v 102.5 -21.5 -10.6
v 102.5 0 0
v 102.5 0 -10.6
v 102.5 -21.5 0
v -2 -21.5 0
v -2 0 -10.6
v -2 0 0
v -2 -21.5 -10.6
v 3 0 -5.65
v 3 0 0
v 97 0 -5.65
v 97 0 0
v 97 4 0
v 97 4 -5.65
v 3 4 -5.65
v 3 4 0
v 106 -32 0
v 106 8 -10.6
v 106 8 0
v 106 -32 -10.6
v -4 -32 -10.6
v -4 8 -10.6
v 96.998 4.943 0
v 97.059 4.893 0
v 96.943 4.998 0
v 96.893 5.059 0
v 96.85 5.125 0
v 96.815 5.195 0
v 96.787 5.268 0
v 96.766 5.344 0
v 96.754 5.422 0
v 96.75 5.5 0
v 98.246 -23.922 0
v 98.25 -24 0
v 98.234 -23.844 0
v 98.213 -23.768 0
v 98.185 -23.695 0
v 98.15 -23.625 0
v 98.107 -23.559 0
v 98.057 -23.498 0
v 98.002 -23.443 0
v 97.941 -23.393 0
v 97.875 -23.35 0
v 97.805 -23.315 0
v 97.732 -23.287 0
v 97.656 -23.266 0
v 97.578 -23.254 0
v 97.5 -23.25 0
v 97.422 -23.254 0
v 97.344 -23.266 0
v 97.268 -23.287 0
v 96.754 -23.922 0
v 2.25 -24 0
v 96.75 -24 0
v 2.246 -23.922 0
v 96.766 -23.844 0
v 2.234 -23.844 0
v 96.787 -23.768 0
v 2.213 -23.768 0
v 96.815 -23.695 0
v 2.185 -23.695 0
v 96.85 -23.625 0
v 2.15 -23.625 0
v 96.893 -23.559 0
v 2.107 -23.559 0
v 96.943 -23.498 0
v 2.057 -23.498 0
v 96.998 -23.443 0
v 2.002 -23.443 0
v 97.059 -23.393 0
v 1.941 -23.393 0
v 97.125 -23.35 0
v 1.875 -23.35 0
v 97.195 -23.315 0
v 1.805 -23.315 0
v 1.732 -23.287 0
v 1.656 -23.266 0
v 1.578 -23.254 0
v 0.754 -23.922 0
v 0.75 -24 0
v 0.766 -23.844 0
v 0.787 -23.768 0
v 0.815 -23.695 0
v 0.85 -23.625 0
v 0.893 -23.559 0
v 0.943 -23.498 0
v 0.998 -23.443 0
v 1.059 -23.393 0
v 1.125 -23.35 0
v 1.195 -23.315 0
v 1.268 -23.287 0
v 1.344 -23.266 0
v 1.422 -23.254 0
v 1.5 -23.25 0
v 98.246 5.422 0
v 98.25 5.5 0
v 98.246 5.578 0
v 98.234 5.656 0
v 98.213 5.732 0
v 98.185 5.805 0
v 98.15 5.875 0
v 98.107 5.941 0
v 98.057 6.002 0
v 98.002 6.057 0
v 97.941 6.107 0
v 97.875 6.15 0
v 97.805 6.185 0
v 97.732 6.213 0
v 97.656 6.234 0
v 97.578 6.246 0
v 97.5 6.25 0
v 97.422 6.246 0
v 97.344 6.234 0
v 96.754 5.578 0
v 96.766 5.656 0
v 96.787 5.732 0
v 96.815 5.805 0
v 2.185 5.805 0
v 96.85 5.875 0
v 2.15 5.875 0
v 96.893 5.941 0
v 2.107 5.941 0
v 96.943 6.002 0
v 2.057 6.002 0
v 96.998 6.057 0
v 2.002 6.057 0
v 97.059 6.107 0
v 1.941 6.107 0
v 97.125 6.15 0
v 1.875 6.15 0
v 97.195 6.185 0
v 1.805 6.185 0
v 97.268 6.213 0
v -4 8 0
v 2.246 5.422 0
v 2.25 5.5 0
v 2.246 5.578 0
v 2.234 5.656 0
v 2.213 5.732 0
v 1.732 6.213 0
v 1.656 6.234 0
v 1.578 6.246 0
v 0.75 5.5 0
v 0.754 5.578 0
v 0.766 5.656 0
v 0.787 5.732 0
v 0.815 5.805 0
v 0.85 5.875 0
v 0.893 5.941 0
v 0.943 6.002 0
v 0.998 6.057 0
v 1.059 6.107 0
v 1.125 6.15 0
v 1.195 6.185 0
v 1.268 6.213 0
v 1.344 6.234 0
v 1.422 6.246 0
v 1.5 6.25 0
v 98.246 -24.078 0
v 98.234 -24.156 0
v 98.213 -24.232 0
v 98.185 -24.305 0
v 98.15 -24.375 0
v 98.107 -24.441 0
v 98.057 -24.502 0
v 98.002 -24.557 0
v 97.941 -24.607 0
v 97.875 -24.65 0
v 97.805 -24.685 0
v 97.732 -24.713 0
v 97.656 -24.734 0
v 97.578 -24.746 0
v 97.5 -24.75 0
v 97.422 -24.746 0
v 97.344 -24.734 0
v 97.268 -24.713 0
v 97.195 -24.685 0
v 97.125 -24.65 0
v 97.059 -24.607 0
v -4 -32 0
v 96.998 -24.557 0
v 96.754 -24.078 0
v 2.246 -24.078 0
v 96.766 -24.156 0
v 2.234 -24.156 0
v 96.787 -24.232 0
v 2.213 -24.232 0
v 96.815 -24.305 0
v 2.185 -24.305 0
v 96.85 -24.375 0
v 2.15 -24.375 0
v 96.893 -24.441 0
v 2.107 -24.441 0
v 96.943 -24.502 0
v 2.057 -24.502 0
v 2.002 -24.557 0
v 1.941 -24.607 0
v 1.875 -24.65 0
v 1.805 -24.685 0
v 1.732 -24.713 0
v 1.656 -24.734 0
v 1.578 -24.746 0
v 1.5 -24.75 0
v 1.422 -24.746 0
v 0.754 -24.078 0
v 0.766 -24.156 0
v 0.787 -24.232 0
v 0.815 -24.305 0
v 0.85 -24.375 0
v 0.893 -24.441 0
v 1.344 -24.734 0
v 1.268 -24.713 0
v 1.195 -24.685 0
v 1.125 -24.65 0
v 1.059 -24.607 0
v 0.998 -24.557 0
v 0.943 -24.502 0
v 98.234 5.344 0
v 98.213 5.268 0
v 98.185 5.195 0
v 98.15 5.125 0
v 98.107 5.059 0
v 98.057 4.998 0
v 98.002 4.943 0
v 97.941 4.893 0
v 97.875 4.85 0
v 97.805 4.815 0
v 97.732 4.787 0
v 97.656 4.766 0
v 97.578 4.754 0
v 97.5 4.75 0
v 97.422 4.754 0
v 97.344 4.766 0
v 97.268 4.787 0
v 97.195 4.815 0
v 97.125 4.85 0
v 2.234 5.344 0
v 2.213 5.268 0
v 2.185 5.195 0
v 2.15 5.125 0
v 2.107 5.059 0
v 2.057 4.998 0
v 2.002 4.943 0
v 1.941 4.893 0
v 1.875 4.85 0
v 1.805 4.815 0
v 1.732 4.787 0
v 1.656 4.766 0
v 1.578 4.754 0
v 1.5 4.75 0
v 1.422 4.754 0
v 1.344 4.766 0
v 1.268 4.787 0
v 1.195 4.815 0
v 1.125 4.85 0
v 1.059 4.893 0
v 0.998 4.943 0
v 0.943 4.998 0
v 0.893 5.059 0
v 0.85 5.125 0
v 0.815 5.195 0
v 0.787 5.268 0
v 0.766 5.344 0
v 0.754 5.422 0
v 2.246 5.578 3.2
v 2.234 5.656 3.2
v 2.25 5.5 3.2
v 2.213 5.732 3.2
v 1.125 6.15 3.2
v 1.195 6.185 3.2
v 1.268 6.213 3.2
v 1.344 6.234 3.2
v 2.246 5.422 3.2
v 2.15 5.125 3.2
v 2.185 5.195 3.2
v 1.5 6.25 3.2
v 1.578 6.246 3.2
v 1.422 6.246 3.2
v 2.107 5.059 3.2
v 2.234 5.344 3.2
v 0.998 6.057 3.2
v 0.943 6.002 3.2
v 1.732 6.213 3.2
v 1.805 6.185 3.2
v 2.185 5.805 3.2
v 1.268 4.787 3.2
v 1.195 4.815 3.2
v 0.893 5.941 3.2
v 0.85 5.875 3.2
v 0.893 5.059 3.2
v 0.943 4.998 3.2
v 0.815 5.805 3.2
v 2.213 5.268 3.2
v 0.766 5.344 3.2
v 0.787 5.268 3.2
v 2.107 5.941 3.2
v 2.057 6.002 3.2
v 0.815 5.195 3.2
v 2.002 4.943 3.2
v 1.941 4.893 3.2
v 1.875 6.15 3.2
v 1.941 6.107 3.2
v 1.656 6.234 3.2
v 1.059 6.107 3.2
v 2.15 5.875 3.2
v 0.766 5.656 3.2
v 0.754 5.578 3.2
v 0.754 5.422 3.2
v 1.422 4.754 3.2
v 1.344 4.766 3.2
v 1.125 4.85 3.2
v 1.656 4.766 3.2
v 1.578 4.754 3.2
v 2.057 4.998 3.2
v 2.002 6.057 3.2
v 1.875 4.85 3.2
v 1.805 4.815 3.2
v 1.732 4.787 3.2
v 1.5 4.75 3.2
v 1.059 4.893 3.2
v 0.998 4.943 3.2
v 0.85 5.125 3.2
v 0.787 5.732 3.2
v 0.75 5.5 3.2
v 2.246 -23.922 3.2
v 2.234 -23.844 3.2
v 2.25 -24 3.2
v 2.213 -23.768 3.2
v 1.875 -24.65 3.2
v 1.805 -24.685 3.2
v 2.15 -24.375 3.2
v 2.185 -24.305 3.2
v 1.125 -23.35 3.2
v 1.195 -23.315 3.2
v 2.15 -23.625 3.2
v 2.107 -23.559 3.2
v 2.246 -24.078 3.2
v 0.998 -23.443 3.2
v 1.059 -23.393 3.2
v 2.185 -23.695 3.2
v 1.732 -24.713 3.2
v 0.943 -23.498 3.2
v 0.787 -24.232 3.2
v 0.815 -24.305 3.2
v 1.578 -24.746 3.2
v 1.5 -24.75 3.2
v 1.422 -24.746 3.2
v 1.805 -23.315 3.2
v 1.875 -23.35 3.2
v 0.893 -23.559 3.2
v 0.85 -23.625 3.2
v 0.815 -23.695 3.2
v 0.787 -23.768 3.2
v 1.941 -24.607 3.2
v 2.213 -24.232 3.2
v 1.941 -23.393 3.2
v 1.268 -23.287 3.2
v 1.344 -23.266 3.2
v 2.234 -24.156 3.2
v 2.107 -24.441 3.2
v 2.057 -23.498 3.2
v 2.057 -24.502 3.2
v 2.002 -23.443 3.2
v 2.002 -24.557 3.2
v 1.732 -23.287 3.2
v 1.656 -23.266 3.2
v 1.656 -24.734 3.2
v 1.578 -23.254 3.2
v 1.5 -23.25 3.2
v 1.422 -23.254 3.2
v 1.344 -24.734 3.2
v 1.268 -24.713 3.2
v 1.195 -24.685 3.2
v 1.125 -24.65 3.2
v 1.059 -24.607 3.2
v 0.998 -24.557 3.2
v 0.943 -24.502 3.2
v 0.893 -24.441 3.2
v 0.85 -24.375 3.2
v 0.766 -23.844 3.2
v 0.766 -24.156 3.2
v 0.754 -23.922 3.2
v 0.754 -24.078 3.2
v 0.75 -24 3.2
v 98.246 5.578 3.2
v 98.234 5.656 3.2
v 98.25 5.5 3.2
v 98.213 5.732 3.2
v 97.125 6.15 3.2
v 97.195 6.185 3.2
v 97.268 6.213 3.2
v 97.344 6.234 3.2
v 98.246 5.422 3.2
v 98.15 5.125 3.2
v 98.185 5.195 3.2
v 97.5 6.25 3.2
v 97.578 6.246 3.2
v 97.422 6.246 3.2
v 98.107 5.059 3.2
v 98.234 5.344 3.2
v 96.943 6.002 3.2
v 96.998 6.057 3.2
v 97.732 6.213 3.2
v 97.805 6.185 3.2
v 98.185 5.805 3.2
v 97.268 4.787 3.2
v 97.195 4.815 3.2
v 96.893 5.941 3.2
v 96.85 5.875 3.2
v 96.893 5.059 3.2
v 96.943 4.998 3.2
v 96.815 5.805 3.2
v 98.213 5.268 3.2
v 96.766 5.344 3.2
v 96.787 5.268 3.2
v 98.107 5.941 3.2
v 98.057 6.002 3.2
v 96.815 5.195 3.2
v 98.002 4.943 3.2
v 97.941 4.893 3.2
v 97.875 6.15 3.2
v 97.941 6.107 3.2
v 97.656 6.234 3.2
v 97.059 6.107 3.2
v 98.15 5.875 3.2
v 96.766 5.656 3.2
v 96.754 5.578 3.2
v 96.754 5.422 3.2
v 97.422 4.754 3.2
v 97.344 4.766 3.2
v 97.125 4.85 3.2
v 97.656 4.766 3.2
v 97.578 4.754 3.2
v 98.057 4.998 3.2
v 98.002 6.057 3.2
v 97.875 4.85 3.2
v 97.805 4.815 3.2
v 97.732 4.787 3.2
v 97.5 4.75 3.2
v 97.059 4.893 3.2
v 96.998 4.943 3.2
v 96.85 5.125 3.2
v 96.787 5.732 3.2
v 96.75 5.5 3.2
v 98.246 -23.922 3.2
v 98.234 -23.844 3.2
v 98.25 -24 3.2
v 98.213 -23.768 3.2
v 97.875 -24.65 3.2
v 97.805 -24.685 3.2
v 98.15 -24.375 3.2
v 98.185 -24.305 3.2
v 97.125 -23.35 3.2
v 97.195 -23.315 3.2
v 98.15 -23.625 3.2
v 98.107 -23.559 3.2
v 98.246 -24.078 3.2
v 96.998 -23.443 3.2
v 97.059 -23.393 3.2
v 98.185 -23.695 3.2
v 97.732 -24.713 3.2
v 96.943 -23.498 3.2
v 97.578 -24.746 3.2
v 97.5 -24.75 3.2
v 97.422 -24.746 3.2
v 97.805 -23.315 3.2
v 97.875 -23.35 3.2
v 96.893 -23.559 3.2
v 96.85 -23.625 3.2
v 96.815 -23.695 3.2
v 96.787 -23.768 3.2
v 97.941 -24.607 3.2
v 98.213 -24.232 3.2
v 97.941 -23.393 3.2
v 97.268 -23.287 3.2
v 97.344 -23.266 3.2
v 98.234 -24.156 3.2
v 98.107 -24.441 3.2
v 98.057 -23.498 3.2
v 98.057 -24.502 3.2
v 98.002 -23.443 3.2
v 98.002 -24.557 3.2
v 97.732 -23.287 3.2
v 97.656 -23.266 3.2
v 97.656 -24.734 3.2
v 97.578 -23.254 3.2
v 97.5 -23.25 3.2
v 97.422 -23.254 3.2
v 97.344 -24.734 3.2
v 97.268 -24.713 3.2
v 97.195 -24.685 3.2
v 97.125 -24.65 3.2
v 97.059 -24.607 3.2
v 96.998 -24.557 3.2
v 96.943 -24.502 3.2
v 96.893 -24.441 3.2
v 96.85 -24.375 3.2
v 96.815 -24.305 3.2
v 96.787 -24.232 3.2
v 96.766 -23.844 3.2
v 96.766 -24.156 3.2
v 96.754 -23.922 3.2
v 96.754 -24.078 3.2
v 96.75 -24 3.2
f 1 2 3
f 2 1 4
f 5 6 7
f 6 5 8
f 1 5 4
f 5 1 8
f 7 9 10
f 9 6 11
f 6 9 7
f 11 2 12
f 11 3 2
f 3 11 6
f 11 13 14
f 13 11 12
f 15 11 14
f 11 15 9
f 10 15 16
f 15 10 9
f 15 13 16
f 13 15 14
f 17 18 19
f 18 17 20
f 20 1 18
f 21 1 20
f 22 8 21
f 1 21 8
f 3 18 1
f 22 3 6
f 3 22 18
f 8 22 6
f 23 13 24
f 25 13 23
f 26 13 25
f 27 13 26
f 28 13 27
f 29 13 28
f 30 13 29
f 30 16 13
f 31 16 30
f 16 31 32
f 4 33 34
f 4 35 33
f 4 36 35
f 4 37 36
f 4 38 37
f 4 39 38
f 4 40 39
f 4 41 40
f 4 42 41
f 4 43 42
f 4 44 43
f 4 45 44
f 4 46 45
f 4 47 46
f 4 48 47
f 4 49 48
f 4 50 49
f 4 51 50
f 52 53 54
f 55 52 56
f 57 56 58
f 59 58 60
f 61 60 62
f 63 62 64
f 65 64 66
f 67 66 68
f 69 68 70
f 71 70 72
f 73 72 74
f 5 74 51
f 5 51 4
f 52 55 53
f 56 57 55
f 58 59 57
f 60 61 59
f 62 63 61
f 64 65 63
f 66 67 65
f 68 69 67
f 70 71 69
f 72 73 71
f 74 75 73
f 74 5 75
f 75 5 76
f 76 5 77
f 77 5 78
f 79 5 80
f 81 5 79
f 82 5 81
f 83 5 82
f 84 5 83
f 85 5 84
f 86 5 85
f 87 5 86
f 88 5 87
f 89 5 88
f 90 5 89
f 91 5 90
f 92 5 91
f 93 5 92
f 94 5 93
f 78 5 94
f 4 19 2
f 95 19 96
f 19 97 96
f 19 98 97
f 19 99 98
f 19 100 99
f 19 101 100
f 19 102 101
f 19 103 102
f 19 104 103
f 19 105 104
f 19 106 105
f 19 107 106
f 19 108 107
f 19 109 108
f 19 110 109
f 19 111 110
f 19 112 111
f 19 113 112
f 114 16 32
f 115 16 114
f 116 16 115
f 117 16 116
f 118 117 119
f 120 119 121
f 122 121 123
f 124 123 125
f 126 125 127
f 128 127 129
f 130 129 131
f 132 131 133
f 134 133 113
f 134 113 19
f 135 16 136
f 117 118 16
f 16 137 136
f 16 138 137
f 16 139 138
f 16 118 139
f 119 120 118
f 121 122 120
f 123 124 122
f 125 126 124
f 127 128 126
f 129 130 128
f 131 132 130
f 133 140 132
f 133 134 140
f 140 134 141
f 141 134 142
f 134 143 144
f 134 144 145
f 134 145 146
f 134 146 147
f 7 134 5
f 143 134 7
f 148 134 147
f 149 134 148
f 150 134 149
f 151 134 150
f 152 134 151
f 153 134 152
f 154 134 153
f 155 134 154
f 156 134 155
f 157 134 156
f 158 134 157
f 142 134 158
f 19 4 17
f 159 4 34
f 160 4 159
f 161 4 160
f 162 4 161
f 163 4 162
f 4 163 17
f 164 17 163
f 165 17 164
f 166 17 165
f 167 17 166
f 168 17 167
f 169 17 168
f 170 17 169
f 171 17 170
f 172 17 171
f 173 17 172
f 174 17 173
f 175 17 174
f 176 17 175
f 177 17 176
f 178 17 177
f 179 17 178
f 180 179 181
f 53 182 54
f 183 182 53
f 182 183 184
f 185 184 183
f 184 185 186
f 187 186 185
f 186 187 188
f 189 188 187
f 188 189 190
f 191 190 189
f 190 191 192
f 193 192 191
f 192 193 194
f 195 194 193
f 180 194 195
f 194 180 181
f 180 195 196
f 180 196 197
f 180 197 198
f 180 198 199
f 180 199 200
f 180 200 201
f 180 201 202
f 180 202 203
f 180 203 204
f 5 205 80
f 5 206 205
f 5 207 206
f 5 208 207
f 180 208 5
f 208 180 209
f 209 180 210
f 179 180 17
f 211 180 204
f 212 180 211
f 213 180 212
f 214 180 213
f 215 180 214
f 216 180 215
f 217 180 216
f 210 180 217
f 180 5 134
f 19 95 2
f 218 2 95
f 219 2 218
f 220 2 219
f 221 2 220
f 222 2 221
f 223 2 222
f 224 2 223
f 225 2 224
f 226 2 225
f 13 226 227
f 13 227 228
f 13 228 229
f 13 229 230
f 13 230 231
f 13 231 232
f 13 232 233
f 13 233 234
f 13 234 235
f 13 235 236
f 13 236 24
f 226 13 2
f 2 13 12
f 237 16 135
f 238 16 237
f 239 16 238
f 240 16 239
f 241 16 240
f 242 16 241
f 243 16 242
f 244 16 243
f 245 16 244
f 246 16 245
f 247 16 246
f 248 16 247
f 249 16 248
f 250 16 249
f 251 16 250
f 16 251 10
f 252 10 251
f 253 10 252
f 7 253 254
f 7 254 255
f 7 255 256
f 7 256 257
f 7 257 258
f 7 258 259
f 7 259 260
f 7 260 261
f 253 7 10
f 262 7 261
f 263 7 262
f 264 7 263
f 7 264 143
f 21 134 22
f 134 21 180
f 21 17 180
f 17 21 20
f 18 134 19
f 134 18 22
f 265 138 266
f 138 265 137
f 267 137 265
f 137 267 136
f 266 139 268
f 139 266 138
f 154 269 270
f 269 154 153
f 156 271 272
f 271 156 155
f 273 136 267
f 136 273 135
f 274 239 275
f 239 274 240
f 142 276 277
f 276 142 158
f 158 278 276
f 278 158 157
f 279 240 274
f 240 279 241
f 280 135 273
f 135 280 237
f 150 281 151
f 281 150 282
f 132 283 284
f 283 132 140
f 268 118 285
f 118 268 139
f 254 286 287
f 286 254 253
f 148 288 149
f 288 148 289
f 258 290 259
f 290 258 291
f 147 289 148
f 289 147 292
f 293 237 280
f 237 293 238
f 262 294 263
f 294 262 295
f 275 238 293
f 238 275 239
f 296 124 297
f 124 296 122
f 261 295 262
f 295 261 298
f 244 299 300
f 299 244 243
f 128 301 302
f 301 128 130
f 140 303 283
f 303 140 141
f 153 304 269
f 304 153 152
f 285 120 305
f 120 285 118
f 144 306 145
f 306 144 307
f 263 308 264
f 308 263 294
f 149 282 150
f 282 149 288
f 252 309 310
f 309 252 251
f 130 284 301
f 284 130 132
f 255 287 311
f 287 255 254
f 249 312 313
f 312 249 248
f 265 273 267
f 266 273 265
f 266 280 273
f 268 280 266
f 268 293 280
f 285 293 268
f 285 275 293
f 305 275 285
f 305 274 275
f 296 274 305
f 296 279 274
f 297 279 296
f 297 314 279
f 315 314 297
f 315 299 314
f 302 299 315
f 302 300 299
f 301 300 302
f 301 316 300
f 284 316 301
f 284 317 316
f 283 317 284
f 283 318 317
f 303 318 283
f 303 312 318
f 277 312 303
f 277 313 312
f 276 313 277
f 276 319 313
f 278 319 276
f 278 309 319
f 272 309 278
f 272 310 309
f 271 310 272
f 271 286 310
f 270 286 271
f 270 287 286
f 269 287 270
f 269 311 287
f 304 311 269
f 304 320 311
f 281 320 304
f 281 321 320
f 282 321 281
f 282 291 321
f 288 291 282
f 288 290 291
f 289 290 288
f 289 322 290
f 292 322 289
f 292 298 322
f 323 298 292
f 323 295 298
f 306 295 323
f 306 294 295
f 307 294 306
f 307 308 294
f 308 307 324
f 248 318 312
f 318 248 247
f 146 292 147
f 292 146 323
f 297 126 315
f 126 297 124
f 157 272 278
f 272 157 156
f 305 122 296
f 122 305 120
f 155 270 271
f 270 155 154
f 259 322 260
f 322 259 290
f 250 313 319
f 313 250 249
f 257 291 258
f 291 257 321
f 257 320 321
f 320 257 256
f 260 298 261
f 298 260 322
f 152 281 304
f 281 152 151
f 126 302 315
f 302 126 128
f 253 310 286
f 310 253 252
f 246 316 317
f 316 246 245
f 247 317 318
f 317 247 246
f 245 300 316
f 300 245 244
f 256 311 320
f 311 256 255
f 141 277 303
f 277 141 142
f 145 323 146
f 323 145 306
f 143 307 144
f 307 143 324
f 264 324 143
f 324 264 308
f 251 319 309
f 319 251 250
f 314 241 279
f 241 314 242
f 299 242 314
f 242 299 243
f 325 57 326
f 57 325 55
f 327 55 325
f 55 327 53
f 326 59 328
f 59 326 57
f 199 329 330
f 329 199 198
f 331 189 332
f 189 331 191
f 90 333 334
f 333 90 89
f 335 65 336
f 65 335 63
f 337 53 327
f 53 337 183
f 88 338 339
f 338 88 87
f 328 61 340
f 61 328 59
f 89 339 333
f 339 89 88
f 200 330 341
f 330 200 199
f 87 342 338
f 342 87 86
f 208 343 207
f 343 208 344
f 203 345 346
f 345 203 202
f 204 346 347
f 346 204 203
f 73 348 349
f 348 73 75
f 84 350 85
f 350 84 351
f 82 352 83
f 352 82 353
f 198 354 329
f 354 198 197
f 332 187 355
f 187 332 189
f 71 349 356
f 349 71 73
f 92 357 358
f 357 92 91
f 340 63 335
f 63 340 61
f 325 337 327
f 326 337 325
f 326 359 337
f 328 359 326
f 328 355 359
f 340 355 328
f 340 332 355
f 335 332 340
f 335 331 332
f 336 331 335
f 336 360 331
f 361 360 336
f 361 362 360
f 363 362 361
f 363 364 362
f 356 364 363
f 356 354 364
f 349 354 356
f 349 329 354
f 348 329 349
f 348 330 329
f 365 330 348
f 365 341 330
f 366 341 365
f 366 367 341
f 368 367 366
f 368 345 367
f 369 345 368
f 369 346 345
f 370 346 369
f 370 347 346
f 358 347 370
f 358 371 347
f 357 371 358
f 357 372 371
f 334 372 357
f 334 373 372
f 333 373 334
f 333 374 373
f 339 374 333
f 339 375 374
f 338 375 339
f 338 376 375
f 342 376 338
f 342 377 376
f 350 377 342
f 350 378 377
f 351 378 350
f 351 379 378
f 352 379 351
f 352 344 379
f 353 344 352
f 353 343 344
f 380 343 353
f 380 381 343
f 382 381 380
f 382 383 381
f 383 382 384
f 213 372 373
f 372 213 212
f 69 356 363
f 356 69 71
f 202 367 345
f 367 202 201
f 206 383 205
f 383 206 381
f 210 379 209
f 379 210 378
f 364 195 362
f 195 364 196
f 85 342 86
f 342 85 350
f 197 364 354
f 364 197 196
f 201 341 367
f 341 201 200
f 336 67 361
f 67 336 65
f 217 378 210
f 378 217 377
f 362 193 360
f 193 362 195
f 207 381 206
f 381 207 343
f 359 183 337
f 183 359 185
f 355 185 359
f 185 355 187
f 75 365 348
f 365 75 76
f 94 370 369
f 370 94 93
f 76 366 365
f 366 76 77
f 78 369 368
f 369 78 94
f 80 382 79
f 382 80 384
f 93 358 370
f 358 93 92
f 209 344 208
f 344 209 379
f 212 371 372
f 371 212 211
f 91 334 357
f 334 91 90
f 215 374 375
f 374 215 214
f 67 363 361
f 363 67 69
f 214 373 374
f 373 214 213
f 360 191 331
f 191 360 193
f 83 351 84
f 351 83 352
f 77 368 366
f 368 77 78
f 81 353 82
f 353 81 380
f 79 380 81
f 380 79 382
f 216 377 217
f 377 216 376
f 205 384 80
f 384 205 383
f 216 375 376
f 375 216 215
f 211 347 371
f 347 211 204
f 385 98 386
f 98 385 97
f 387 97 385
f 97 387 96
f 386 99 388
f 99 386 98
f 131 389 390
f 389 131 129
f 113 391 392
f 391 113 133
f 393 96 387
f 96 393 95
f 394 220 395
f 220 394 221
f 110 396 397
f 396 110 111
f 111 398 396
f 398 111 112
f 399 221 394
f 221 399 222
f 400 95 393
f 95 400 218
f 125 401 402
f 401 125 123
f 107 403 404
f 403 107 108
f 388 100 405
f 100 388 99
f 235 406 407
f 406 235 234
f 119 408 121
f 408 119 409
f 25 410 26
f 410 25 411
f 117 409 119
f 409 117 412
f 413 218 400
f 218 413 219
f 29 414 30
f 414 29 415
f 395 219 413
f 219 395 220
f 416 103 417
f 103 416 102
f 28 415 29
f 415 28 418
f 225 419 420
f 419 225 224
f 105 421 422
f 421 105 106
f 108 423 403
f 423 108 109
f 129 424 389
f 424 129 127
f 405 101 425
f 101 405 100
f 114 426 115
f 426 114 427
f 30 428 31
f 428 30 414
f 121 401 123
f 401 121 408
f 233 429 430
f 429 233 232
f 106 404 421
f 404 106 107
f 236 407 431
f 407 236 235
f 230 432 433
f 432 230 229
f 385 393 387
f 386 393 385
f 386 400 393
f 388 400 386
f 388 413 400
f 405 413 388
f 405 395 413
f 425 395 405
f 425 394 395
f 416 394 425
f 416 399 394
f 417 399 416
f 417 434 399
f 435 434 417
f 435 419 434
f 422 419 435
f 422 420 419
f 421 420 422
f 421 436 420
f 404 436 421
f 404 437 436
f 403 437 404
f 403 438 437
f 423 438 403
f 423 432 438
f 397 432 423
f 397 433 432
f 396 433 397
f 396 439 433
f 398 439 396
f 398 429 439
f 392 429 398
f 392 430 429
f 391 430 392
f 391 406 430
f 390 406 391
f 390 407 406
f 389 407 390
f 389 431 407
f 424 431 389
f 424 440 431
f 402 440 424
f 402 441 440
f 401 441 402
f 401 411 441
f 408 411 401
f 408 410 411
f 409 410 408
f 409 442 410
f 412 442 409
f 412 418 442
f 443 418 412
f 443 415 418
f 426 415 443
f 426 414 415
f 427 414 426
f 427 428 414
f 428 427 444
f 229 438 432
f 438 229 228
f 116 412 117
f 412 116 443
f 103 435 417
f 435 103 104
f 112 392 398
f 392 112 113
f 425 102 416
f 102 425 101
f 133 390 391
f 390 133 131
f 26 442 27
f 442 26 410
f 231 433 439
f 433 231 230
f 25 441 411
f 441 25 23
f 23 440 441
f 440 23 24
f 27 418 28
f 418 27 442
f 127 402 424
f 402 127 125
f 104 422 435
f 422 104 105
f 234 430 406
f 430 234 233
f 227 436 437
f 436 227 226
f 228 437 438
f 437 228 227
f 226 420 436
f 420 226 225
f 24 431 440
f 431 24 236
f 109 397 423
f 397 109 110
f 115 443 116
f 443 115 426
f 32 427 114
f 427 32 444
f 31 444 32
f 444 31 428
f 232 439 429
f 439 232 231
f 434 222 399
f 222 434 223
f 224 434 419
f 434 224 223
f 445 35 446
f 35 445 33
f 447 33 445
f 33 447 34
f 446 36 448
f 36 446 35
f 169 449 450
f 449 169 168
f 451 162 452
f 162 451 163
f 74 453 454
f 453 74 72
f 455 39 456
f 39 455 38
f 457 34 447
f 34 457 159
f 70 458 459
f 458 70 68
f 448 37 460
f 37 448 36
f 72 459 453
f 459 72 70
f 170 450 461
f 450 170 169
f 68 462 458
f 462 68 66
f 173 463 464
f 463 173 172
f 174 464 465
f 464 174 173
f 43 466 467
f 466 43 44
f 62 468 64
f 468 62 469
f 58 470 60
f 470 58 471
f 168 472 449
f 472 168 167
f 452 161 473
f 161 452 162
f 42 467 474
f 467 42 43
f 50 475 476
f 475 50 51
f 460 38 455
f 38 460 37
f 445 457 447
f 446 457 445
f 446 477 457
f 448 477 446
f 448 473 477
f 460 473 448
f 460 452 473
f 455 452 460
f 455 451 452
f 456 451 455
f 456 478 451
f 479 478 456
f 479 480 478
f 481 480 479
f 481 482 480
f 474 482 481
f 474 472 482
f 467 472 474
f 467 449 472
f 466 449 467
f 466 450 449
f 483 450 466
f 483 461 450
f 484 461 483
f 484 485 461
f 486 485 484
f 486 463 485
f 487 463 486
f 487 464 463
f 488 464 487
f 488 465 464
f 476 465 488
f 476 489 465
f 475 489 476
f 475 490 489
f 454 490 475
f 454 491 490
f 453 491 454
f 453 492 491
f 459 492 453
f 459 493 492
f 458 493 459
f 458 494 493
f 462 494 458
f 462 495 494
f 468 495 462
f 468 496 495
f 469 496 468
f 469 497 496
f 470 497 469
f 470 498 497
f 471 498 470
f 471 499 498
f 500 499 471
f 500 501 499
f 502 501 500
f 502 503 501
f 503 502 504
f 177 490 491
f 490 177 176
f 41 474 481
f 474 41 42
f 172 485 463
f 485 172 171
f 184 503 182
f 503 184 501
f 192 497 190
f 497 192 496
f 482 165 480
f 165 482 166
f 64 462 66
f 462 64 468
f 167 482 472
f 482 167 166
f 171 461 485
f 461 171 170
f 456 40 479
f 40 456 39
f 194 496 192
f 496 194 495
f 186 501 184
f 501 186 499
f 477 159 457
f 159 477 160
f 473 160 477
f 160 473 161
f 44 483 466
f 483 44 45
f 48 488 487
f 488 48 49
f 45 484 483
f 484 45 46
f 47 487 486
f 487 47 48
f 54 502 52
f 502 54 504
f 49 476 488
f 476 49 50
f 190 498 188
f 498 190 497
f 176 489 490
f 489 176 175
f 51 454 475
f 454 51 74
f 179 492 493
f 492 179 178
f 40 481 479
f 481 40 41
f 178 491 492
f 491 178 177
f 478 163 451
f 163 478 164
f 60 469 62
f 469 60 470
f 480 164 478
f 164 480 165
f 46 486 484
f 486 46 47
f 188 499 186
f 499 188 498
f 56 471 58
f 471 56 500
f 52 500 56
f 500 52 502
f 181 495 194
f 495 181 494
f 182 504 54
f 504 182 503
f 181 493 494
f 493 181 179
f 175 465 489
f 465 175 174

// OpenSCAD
rotate([180, 0, 0]) {
    difference() {
        translate([-4, -8, 0]) {
            cube([110, 40, 10.6]);
        }

        union() {
            translate([-2, 0, -0.05]) {
                cube([104.5, 21.5, 10.7]);
            }
            translate([3, -4, -0.05]) {
                cube([94, 4, 5.7]);
            }
        }
    }
}

// topleft
translate([1.5, 5.5, 0]) {
    cylinder(d=1.5, h=3.2, $fn=60);
}

// bottomleft
translate([1.5, 5.5-29.5, 0]) {
    cylinder(d=1.5, h=3.2, $fn=60);
}

// topright
translate([1.5+96, 5.5, 0]) {
    cylinder(d=1.5, h=3.2, $fn=60);
}

// bottomright
translate([1.5+96, 5.5-29.5, 0]) {
    cylinder(d=1.5, h=3.2, $fn=60);
}
